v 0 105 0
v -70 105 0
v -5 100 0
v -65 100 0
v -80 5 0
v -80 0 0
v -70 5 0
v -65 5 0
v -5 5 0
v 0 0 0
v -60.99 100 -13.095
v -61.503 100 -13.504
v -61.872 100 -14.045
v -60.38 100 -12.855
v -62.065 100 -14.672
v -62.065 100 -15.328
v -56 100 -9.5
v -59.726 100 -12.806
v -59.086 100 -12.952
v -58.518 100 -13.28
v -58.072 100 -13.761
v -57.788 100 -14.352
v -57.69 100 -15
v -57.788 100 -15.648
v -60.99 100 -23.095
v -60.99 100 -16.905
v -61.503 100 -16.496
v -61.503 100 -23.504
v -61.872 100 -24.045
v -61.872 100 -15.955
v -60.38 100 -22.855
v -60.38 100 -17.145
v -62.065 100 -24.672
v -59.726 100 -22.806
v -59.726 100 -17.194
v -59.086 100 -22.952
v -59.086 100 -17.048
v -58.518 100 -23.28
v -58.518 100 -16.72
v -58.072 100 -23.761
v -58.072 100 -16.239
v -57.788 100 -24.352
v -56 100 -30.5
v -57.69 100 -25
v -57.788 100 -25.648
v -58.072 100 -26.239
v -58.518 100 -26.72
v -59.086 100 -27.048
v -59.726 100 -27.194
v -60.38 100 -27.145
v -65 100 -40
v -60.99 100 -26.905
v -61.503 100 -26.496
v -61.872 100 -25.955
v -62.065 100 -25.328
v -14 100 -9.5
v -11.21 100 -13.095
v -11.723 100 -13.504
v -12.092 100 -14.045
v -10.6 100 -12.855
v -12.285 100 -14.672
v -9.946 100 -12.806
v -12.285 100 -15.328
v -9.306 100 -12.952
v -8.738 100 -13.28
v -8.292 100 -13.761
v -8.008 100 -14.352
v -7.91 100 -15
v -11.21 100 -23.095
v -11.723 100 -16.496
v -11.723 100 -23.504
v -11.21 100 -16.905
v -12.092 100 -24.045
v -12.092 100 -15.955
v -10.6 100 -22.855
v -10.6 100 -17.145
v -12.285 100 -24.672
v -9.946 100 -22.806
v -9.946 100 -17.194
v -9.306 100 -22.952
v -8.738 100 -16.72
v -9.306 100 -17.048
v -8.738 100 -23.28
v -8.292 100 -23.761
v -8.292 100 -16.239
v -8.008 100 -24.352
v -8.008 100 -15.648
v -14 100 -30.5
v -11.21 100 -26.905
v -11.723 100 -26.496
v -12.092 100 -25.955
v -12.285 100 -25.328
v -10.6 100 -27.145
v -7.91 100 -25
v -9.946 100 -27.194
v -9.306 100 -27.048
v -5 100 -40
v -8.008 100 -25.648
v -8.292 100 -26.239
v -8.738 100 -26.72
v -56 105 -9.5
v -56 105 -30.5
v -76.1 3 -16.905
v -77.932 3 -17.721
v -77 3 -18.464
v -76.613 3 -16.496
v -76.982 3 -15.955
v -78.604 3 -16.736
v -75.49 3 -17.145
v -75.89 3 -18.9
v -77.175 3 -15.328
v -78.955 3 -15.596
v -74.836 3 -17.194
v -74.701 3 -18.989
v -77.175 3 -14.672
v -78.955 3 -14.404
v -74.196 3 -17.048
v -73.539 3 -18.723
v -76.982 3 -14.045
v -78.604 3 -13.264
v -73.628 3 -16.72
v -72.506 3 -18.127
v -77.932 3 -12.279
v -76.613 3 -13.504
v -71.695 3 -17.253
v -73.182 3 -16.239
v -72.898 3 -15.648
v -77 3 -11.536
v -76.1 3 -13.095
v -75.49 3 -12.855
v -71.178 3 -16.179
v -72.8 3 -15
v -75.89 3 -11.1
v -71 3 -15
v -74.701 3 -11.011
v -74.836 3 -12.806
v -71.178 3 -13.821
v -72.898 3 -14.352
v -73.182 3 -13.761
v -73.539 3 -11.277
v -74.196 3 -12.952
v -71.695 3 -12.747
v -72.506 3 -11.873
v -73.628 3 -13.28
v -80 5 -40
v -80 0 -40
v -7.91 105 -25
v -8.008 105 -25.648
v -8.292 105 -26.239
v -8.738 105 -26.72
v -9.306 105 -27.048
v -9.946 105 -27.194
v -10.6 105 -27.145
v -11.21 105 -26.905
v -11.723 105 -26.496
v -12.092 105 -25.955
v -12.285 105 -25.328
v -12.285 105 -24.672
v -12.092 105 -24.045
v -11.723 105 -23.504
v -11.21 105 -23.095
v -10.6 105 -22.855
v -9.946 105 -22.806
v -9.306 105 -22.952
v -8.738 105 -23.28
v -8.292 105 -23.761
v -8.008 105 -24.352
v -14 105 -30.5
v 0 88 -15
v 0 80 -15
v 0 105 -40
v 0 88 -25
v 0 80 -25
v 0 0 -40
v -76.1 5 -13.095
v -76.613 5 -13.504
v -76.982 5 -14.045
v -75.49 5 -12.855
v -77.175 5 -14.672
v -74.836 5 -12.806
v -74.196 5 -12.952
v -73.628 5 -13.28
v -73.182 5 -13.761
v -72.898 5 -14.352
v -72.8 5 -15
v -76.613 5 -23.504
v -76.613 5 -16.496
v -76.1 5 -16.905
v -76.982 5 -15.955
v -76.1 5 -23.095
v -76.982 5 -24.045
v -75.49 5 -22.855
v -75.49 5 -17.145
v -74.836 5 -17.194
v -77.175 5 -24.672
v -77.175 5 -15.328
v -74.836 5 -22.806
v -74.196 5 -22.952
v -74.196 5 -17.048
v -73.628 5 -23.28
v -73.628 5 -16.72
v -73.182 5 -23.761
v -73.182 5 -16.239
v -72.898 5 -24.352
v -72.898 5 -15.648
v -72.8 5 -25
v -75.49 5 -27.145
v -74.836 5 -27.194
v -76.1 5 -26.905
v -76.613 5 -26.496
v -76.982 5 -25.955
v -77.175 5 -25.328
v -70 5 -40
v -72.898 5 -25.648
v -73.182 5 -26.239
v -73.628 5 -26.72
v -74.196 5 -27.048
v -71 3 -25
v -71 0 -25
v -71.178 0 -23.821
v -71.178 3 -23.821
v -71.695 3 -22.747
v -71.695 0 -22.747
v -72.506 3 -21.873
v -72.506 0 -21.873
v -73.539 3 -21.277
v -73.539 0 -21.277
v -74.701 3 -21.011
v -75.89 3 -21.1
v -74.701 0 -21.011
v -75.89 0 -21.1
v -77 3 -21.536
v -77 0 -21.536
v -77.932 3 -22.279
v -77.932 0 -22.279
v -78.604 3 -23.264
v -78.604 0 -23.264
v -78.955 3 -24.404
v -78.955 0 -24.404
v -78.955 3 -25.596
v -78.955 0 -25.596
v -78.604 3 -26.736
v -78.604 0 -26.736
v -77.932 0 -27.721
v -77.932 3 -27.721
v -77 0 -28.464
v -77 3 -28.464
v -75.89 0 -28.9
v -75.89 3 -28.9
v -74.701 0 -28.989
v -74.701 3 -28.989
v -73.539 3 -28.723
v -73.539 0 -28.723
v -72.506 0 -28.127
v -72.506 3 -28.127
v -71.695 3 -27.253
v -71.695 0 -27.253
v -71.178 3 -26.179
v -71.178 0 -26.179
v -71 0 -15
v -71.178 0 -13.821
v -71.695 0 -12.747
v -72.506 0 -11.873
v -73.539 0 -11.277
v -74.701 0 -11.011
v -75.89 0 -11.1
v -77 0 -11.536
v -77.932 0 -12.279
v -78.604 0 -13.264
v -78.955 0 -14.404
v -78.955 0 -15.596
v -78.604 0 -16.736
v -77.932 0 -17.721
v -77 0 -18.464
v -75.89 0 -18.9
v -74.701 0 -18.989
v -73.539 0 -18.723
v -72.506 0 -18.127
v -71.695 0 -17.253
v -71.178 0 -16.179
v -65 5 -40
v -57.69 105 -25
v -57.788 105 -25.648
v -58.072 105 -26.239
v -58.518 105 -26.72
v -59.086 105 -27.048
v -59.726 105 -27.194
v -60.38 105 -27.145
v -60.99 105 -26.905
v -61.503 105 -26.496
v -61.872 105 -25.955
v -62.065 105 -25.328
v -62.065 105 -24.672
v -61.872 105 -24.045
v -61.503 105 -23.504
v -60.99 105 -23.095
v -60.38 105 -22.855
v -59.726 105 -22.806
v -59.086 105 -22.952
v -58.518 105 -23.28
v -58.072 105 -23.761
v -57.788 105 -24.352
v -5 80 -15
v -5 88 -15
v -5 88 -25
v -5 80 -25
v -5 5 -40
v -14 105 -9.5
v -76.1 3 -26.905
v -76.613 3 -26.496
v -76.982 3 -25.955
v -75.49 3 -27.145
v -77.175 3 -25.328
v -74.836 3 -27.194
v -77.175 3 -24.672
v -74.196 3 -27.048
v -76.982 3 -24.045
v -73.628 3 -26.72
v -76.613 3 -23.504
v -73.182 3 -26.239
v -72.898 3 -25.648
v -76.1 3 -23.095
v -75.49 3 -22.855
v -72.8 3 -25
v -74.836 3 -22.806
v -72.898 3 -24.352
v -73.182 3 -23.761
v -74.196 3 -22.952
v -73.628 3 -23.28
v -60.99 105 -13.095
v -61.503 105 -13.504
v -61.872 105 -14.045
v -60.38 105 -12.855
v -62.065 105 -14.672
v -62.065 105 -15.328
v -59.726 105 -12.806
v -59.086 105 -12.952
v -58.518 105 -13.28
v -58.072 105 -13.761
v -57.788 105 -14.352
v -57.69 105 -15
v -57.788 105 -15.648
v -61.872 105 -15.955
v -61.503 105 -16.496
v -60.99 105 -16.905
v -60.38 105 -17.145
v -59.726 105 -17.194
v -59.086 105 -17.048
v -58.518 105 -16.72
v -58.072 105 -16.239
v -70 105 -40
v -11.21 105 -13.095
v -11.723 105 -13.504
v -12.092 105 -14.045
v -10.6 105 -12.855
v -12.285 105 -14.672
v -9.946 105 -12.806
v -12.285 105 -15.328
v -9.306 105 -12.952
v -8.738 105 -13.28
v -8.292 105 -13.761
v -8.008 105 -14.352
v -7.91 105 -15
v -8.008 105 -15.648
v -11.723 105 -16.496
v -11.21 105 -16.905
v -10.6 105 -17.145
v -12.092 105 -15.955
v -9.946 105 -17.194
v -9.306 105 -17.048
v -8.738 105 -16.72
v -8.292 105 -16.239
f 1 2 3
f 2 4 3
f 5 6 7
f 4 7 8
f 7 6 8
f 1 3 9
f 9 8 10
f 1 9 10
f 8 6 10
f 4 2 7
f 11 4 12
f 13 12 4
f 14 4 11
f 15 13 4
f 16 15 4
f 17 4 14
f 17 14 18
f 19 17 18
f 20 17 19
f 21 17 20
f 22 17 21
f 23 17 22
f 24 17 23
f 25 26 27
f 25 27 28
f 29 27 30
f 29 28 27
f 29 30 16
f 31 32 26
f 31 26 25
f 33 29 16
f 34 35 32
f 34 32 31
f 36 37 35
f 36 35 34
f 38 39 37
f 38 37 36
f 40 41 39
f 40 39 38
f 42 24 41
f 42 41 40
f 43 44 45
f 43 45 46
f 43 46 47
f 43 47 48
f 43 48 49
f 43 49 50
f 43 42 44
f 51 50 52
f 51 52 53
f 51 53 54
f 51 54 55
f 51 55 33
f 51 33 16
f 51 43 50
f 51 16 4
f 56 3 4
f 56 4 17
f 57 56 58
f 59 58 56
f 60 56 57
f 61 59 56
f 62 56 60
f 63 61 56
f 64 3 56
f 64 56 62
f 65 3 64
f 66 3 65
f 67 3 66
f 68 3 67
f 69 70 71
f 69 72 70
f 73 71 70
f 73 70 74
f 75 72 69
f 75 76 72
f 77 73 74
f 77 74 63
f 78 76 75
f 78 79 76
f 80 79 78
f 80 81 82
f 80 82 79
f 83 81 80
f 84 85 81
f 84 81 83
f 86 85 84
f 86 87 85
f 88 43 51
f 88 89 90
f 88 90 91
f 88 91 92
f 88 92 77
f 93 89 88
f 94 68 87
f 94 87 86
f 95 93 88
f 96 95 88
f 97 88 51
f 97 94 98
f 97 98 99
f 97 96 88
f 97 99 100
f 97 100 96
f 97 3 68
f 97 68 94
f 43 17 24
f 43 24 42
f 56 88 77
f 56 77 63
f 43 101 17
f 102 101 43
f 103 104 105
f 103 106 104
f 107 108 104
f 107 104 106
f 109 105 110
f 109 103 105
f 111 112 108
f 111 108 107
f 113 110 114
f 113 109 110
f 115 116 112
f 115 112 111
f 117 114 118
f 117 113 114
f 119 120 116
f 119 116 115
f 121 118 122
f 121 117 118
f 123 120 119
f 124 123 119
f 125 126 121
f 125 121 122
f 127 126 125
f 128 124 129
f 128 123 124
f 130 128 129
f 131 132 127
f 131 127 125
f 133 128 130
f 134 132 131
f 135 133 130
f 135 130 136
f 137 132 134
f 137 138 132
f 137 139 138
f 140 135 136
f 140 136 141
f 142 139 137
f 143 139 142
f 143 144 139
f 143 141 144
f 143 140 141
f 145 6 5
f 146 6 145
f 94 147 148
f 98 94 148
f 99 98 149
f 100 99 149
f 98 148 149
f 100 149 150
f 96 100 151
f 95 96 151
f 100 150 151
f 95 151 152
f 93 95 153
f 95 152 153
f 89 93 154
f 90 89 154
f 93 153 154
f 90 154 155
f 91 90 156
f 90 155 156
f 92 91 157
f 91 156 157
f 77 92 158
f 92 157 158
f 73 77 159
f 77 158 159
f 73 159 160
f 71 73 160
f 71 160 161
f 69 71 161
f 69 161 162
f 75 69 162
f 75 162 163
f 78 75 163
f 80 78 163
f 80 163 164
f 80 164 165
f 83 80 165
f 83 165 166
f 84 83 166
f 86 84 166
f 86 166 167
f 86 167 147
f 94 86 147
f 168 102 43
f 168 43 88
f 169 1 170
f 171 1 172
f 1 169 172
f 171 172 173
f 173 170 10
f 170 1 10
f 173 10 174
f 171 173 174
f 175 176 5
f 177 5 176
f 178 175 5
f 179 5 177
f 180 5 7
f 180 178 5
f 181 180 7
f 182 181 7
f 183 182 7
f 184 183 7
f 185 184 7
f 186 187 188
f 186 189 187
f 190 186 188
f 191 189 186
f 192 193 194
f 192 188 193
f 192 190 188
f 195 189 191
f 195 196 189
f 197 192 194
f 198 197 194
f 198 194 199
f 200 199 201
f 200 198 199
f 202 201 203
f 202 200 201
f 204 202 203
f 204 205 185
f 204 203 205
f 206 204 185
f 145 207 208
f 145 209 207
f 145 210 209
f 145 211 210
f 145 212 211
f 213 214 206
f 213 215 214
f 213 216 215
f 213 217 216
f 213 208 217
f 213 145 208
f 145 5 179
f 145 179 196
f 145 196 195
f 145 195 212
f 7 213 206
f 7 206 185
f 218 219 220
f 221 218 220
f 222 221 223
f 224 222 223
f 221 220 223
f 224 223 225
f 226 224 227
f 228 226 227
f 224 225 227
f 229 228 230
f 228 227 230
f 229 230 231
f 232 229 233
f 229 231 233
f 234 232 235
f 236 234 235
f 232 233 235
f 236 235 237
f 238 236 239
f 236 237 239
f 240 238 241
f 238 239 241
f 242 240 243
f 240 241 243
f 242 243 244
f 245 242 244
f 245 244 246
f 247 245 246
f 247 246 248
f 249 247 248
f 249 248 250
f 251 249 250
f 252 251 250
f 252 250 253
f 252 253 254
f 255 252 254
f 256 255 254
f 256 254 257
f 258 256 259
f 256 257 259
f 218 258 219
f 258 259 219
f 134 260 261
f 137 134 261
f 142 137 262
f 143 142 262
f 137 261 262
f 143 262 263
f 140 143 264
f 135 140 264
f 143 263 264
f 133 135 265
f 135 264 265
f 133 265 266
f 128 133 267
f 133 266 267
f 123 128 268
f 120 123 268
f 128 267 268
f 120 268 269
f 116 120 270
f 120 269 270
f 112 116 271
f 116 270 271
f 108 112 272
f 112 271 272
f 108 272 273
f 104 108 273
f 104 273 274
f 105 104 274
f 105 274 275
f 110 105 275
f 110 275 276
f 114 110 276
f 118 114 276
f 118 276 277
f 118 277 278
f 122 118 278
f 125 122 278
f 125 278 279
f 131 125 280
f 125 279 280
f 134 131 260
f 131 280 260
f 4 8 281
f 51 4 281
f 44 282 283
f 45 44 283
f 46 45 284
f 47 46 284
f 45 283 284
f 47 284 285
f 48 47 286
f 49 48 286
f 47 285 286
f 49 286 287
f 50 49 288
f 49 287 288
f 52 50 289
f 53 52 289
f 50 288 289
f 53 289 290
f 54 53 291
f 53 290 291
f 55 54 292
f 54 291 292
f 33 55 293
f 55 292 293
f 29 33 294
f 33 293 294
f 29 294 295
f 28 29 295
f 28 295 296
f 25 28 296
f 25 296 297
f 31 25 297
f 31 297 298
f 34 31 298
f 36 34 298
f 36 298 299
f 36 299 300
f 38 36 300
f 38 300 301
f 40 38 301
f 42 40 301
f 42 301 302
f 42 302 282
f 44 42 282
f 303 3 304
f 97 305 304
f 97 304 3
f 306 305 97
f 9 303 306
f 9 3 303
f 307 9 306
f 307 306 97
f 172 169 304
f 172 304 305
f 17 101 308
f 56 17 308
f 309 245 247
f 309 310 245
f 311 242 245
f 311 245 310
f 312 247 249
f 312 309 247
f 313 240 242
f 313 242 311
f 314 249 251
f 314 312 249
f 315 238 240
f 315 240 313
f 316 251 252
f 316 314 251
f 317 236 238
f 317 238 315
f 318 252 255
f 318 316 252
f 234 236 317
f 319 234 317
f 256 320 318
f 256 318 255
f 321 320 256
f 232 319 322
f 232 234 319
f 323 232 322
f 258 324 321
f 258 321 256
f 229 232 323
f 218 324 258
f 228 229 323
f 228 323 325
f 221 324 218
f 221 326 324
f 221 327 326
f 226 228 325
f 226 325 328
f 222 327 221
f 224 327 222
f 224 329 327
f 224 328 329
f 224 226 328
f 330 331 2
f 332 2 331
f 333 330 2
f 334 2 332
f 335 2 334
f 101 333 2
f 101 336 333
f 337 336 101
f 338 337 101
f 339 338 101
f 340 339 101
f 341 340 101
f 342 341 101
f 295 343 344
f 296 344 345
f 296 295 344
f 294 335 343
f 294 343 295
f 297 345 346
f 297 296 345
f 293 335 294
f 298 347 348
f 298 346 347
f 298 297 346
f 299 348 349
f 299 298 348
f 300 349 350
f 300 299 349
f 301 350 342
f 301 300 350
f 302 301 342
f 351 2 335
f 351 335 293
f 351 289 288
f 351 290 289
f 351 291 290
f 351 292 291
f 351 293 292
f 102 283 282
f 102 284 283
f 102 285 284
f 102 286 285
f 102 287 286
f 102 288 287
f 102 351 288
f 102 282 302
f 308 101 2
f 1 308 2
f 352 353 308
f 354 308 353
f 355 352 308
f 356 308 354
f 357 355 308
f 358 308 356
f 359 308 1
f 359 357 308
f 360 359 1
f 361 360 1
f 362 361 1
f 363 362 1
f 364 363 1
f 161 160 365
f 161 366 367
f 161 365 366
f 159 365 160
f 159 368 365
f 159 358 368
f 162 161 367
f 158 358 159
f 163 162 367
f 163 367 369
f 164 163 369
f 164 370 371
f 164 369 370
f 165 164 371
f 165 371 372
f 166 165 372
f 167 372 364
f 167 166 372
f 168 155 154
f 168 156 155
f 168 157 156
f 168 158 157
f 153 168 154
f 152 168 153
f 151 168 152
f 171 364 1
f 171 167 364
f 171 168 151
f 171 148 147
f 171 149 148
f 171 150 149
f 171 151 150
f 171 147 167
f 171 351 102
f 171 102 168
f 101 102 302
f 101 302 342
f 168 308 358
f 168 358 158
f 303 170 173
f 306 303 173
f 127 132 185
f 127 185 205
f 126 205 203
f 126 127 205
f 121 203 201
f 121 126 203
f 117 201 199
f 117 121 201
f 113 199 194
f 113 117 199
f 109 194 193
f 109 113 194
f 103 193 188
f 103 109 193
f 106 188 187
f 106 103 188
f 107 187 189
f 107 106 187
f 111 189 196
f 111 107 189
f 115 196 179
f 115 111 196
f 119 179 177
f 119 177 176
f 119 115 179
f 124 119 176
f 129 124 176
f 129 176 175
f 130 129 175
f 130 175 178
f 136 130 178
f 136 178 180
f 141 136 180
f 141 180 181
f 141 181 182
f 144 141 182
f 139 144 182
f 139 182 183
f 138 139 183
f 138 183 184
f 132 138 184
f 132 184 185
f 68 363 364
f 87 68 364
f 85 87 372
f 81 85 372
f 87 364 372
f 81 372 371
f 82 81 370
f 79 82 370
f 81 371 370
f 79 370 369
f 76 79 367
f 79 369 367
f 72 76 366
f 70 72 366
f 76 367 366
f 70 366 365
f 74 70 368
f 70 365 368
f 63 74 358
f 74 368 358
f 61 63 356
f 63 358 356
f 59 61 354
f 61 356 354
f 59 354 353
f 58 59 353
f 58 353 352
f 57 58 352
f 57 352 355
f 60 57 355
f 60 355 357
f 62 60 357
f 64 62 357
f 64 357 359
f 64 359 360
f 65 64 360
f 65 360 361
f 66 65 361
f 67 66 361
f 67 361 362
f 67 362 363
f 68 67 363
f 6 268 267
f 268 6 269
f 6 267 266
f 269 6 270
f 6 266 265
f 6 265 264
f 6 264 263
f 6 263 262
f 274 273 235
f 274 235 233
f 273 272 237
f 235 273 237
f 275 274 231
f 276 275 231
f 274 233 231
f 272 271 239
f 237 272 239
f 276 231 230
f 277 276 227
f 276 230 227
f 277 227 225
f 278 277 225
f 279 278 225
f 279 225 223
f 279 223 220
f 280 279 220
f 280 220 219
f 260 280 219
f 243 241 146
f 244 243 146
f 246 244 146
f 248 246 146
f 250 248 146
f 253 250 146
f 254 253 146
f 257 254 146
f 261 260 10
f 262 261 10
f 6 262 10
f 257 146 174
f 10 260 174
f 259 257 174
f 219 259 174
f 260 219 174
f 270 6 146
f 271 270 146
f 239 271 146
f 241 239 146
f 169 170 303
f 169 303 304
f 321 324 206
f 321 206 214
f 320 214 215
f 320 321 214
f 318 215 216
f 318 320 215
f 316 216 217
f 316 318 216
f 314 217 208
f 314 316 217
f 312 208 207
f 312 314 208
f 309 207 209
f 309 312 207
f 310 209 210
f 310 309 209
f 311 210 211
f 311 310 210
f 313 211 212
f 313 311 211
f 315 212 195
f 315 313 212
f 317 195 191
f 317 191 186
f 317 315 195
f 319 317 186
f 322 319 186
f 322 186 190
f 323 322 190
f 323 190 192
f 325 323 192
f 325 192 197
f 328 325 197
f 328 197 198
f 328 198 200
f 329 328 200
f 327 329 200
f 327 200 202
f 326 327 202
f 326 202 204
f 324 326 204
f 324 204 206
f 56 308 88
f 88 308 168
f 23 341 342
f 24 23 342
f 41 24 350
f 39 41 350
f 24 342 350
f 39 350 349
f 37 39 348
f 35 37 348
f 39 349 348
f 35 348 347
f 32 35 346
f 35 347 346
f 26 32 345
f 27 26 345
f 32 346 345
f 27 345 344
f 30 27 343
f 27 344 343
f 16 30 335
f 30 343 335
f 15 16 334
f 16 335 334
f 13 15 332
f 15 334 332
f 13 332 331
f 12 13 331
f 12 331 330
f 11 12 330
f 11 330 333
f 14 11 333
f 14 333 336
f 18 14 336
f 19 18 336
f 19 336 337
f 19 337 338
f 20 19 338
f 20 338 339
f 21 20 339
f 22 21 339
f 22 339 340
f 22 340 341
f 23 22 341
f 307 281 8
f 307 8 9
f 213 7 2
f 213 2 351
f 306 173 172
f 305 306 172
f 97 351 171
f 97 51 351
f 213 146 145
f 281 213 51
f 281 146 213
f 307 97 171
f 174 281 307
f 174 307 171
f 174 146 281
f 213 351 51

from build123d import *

# Parameters (mm, degrees)
SKETCH2_W           = 80
SKETCH2_H           = 40
SKETCH2_R           = 2.2
BOSS_EXTRUDE1_DEPTH = 5
SKETCH3_W           = 5
SKETCH3_H           = 40
BOSS_EXTRUDE2_DEPTH = 100
SKETCH4_W           = 10
SKETCH4_H           = 8
CUT_EXTRUDE1_DEPTH  = 10
SKETCH5_W           = 40
SKETCH5_H           = 5
BOSS_EXTRUDE3_DEPTH = 70
SKETCH6_R           = 2.2
SKETCH6_W           = 42
SKETCH6_H           = 21
CUT_EXTRUDE2_DEPTH  = 70
SKETCH7_R           = 4
SKETCH7_R_2         = 2.2
CUT_EXTRUDE3_DEPTH  = 3


with BuildPart() as part:
    # Sketch2 → Boss-Extrude1 (new body)
    with BuildSketch(Plane(origin=(0, 0, 0), x_dir=(1, 0, 0), z_dir=(0, 1, 0))):
        with Locations((-40, 20)):
            Rectangle(SKETCH2_W, SKETCH2_H)
        with Locations((-75, 25)):
            Circle(SKETCH2_R, mode=Mode.SUBTRACT)
        with Locations((-75, 15)):
            Circle(SKETCH2_R, mode=Mode.SUBTRACT)
    extrude(amount=BOSS_EXTRUDE1_DEPTH)

    # Sketch3 → Boss-Extrude2 (add)
    with BuildSketch(Plane(origin=(0, 5, 0), x_dir=(1, 0, 0), z_dir=(0, 1, 0))):
        with Locations((-2.5, 20)):
            Rectangle(SKETCH3_W, SKETCH3_H)
        with Locations((-67.5, 20)):
            Rectangle(SKETCH3_W, SKETCH3_H)
    extrude(amount=BOSS_EXTRUDE2_DEPTH)

    # Sketch4 → Cut-Extrude1 (cut)
    with BuildSketch(Plane(origin=(0, 0, 0), x_dir=(0, 0, -1), z_dir=(1, 0, 0))):
        with Locations((20, 84)):
            Rectangle(SKETCH4_W, SKETCH4_H)
    extrude(amount=-CUT_EXTRUDE1_DEPTH, mode=Mode.SUBTRACT)

    # Sketch5 → Boss-Extrude3 (add)
    with BuildSketch(Plane(origin=(0, 0, 0), x_dir=(0, 0, -1), z_dir=(1, 0, 0))):
        with Locations((20, 102.5)):
            Rectangle(SKETCH5_W, SKETCH5_H)
    extrude(amount=-BOSS_EXTRUDE3_DEPTH)

    # Sketch6 → Cut-Extrude2 (cut)
    with BuildSketch(Plane(origin=(0, 105, 0), x_dir=(1, 0, 0), z_dir=(0, 1, 0))):
        with Locations((-59.89, 25)):
            Circle(SKETCH6_R)
        with Locations((-59.89, 15)):
            Circle(SKETCH6_R)
        with Locations((-10.11, 15)):
            Circle(SKETCH6_R)
        with Locations((-10.11, 25)):
            Circle(SKETCH6_R)
        with Locations((-35, 20)):
            Rectangle(SKETCH6_W, SKETCH6_H)
    extrude(amount=-CUT_EXTRUDE2_DEPTH, mode=Mode.SUBTRACT)

    # Sketch7 → Cut-Extrude3 (cut)
    with BuildSketch(Plane.XZ):
        with Locations((-75, -15)):
            Circle(SKETCH7_R)
        with Locations((-75, -15)):
            Circle(SKETCH7_R_2, mode=Mode.SUBTRACT)
        with Locations((-75, -25)):
            Circle(SKETCH7_R)
        with Locations((-75, -25)):
            Circle(SKETCH7_R_2, mode=Mode.SUBTRACT)
    extrude(amount=-CUT_EXTRUDE3_DEPTH, mode=Mode.SUBTRACT)


solid = part.part
